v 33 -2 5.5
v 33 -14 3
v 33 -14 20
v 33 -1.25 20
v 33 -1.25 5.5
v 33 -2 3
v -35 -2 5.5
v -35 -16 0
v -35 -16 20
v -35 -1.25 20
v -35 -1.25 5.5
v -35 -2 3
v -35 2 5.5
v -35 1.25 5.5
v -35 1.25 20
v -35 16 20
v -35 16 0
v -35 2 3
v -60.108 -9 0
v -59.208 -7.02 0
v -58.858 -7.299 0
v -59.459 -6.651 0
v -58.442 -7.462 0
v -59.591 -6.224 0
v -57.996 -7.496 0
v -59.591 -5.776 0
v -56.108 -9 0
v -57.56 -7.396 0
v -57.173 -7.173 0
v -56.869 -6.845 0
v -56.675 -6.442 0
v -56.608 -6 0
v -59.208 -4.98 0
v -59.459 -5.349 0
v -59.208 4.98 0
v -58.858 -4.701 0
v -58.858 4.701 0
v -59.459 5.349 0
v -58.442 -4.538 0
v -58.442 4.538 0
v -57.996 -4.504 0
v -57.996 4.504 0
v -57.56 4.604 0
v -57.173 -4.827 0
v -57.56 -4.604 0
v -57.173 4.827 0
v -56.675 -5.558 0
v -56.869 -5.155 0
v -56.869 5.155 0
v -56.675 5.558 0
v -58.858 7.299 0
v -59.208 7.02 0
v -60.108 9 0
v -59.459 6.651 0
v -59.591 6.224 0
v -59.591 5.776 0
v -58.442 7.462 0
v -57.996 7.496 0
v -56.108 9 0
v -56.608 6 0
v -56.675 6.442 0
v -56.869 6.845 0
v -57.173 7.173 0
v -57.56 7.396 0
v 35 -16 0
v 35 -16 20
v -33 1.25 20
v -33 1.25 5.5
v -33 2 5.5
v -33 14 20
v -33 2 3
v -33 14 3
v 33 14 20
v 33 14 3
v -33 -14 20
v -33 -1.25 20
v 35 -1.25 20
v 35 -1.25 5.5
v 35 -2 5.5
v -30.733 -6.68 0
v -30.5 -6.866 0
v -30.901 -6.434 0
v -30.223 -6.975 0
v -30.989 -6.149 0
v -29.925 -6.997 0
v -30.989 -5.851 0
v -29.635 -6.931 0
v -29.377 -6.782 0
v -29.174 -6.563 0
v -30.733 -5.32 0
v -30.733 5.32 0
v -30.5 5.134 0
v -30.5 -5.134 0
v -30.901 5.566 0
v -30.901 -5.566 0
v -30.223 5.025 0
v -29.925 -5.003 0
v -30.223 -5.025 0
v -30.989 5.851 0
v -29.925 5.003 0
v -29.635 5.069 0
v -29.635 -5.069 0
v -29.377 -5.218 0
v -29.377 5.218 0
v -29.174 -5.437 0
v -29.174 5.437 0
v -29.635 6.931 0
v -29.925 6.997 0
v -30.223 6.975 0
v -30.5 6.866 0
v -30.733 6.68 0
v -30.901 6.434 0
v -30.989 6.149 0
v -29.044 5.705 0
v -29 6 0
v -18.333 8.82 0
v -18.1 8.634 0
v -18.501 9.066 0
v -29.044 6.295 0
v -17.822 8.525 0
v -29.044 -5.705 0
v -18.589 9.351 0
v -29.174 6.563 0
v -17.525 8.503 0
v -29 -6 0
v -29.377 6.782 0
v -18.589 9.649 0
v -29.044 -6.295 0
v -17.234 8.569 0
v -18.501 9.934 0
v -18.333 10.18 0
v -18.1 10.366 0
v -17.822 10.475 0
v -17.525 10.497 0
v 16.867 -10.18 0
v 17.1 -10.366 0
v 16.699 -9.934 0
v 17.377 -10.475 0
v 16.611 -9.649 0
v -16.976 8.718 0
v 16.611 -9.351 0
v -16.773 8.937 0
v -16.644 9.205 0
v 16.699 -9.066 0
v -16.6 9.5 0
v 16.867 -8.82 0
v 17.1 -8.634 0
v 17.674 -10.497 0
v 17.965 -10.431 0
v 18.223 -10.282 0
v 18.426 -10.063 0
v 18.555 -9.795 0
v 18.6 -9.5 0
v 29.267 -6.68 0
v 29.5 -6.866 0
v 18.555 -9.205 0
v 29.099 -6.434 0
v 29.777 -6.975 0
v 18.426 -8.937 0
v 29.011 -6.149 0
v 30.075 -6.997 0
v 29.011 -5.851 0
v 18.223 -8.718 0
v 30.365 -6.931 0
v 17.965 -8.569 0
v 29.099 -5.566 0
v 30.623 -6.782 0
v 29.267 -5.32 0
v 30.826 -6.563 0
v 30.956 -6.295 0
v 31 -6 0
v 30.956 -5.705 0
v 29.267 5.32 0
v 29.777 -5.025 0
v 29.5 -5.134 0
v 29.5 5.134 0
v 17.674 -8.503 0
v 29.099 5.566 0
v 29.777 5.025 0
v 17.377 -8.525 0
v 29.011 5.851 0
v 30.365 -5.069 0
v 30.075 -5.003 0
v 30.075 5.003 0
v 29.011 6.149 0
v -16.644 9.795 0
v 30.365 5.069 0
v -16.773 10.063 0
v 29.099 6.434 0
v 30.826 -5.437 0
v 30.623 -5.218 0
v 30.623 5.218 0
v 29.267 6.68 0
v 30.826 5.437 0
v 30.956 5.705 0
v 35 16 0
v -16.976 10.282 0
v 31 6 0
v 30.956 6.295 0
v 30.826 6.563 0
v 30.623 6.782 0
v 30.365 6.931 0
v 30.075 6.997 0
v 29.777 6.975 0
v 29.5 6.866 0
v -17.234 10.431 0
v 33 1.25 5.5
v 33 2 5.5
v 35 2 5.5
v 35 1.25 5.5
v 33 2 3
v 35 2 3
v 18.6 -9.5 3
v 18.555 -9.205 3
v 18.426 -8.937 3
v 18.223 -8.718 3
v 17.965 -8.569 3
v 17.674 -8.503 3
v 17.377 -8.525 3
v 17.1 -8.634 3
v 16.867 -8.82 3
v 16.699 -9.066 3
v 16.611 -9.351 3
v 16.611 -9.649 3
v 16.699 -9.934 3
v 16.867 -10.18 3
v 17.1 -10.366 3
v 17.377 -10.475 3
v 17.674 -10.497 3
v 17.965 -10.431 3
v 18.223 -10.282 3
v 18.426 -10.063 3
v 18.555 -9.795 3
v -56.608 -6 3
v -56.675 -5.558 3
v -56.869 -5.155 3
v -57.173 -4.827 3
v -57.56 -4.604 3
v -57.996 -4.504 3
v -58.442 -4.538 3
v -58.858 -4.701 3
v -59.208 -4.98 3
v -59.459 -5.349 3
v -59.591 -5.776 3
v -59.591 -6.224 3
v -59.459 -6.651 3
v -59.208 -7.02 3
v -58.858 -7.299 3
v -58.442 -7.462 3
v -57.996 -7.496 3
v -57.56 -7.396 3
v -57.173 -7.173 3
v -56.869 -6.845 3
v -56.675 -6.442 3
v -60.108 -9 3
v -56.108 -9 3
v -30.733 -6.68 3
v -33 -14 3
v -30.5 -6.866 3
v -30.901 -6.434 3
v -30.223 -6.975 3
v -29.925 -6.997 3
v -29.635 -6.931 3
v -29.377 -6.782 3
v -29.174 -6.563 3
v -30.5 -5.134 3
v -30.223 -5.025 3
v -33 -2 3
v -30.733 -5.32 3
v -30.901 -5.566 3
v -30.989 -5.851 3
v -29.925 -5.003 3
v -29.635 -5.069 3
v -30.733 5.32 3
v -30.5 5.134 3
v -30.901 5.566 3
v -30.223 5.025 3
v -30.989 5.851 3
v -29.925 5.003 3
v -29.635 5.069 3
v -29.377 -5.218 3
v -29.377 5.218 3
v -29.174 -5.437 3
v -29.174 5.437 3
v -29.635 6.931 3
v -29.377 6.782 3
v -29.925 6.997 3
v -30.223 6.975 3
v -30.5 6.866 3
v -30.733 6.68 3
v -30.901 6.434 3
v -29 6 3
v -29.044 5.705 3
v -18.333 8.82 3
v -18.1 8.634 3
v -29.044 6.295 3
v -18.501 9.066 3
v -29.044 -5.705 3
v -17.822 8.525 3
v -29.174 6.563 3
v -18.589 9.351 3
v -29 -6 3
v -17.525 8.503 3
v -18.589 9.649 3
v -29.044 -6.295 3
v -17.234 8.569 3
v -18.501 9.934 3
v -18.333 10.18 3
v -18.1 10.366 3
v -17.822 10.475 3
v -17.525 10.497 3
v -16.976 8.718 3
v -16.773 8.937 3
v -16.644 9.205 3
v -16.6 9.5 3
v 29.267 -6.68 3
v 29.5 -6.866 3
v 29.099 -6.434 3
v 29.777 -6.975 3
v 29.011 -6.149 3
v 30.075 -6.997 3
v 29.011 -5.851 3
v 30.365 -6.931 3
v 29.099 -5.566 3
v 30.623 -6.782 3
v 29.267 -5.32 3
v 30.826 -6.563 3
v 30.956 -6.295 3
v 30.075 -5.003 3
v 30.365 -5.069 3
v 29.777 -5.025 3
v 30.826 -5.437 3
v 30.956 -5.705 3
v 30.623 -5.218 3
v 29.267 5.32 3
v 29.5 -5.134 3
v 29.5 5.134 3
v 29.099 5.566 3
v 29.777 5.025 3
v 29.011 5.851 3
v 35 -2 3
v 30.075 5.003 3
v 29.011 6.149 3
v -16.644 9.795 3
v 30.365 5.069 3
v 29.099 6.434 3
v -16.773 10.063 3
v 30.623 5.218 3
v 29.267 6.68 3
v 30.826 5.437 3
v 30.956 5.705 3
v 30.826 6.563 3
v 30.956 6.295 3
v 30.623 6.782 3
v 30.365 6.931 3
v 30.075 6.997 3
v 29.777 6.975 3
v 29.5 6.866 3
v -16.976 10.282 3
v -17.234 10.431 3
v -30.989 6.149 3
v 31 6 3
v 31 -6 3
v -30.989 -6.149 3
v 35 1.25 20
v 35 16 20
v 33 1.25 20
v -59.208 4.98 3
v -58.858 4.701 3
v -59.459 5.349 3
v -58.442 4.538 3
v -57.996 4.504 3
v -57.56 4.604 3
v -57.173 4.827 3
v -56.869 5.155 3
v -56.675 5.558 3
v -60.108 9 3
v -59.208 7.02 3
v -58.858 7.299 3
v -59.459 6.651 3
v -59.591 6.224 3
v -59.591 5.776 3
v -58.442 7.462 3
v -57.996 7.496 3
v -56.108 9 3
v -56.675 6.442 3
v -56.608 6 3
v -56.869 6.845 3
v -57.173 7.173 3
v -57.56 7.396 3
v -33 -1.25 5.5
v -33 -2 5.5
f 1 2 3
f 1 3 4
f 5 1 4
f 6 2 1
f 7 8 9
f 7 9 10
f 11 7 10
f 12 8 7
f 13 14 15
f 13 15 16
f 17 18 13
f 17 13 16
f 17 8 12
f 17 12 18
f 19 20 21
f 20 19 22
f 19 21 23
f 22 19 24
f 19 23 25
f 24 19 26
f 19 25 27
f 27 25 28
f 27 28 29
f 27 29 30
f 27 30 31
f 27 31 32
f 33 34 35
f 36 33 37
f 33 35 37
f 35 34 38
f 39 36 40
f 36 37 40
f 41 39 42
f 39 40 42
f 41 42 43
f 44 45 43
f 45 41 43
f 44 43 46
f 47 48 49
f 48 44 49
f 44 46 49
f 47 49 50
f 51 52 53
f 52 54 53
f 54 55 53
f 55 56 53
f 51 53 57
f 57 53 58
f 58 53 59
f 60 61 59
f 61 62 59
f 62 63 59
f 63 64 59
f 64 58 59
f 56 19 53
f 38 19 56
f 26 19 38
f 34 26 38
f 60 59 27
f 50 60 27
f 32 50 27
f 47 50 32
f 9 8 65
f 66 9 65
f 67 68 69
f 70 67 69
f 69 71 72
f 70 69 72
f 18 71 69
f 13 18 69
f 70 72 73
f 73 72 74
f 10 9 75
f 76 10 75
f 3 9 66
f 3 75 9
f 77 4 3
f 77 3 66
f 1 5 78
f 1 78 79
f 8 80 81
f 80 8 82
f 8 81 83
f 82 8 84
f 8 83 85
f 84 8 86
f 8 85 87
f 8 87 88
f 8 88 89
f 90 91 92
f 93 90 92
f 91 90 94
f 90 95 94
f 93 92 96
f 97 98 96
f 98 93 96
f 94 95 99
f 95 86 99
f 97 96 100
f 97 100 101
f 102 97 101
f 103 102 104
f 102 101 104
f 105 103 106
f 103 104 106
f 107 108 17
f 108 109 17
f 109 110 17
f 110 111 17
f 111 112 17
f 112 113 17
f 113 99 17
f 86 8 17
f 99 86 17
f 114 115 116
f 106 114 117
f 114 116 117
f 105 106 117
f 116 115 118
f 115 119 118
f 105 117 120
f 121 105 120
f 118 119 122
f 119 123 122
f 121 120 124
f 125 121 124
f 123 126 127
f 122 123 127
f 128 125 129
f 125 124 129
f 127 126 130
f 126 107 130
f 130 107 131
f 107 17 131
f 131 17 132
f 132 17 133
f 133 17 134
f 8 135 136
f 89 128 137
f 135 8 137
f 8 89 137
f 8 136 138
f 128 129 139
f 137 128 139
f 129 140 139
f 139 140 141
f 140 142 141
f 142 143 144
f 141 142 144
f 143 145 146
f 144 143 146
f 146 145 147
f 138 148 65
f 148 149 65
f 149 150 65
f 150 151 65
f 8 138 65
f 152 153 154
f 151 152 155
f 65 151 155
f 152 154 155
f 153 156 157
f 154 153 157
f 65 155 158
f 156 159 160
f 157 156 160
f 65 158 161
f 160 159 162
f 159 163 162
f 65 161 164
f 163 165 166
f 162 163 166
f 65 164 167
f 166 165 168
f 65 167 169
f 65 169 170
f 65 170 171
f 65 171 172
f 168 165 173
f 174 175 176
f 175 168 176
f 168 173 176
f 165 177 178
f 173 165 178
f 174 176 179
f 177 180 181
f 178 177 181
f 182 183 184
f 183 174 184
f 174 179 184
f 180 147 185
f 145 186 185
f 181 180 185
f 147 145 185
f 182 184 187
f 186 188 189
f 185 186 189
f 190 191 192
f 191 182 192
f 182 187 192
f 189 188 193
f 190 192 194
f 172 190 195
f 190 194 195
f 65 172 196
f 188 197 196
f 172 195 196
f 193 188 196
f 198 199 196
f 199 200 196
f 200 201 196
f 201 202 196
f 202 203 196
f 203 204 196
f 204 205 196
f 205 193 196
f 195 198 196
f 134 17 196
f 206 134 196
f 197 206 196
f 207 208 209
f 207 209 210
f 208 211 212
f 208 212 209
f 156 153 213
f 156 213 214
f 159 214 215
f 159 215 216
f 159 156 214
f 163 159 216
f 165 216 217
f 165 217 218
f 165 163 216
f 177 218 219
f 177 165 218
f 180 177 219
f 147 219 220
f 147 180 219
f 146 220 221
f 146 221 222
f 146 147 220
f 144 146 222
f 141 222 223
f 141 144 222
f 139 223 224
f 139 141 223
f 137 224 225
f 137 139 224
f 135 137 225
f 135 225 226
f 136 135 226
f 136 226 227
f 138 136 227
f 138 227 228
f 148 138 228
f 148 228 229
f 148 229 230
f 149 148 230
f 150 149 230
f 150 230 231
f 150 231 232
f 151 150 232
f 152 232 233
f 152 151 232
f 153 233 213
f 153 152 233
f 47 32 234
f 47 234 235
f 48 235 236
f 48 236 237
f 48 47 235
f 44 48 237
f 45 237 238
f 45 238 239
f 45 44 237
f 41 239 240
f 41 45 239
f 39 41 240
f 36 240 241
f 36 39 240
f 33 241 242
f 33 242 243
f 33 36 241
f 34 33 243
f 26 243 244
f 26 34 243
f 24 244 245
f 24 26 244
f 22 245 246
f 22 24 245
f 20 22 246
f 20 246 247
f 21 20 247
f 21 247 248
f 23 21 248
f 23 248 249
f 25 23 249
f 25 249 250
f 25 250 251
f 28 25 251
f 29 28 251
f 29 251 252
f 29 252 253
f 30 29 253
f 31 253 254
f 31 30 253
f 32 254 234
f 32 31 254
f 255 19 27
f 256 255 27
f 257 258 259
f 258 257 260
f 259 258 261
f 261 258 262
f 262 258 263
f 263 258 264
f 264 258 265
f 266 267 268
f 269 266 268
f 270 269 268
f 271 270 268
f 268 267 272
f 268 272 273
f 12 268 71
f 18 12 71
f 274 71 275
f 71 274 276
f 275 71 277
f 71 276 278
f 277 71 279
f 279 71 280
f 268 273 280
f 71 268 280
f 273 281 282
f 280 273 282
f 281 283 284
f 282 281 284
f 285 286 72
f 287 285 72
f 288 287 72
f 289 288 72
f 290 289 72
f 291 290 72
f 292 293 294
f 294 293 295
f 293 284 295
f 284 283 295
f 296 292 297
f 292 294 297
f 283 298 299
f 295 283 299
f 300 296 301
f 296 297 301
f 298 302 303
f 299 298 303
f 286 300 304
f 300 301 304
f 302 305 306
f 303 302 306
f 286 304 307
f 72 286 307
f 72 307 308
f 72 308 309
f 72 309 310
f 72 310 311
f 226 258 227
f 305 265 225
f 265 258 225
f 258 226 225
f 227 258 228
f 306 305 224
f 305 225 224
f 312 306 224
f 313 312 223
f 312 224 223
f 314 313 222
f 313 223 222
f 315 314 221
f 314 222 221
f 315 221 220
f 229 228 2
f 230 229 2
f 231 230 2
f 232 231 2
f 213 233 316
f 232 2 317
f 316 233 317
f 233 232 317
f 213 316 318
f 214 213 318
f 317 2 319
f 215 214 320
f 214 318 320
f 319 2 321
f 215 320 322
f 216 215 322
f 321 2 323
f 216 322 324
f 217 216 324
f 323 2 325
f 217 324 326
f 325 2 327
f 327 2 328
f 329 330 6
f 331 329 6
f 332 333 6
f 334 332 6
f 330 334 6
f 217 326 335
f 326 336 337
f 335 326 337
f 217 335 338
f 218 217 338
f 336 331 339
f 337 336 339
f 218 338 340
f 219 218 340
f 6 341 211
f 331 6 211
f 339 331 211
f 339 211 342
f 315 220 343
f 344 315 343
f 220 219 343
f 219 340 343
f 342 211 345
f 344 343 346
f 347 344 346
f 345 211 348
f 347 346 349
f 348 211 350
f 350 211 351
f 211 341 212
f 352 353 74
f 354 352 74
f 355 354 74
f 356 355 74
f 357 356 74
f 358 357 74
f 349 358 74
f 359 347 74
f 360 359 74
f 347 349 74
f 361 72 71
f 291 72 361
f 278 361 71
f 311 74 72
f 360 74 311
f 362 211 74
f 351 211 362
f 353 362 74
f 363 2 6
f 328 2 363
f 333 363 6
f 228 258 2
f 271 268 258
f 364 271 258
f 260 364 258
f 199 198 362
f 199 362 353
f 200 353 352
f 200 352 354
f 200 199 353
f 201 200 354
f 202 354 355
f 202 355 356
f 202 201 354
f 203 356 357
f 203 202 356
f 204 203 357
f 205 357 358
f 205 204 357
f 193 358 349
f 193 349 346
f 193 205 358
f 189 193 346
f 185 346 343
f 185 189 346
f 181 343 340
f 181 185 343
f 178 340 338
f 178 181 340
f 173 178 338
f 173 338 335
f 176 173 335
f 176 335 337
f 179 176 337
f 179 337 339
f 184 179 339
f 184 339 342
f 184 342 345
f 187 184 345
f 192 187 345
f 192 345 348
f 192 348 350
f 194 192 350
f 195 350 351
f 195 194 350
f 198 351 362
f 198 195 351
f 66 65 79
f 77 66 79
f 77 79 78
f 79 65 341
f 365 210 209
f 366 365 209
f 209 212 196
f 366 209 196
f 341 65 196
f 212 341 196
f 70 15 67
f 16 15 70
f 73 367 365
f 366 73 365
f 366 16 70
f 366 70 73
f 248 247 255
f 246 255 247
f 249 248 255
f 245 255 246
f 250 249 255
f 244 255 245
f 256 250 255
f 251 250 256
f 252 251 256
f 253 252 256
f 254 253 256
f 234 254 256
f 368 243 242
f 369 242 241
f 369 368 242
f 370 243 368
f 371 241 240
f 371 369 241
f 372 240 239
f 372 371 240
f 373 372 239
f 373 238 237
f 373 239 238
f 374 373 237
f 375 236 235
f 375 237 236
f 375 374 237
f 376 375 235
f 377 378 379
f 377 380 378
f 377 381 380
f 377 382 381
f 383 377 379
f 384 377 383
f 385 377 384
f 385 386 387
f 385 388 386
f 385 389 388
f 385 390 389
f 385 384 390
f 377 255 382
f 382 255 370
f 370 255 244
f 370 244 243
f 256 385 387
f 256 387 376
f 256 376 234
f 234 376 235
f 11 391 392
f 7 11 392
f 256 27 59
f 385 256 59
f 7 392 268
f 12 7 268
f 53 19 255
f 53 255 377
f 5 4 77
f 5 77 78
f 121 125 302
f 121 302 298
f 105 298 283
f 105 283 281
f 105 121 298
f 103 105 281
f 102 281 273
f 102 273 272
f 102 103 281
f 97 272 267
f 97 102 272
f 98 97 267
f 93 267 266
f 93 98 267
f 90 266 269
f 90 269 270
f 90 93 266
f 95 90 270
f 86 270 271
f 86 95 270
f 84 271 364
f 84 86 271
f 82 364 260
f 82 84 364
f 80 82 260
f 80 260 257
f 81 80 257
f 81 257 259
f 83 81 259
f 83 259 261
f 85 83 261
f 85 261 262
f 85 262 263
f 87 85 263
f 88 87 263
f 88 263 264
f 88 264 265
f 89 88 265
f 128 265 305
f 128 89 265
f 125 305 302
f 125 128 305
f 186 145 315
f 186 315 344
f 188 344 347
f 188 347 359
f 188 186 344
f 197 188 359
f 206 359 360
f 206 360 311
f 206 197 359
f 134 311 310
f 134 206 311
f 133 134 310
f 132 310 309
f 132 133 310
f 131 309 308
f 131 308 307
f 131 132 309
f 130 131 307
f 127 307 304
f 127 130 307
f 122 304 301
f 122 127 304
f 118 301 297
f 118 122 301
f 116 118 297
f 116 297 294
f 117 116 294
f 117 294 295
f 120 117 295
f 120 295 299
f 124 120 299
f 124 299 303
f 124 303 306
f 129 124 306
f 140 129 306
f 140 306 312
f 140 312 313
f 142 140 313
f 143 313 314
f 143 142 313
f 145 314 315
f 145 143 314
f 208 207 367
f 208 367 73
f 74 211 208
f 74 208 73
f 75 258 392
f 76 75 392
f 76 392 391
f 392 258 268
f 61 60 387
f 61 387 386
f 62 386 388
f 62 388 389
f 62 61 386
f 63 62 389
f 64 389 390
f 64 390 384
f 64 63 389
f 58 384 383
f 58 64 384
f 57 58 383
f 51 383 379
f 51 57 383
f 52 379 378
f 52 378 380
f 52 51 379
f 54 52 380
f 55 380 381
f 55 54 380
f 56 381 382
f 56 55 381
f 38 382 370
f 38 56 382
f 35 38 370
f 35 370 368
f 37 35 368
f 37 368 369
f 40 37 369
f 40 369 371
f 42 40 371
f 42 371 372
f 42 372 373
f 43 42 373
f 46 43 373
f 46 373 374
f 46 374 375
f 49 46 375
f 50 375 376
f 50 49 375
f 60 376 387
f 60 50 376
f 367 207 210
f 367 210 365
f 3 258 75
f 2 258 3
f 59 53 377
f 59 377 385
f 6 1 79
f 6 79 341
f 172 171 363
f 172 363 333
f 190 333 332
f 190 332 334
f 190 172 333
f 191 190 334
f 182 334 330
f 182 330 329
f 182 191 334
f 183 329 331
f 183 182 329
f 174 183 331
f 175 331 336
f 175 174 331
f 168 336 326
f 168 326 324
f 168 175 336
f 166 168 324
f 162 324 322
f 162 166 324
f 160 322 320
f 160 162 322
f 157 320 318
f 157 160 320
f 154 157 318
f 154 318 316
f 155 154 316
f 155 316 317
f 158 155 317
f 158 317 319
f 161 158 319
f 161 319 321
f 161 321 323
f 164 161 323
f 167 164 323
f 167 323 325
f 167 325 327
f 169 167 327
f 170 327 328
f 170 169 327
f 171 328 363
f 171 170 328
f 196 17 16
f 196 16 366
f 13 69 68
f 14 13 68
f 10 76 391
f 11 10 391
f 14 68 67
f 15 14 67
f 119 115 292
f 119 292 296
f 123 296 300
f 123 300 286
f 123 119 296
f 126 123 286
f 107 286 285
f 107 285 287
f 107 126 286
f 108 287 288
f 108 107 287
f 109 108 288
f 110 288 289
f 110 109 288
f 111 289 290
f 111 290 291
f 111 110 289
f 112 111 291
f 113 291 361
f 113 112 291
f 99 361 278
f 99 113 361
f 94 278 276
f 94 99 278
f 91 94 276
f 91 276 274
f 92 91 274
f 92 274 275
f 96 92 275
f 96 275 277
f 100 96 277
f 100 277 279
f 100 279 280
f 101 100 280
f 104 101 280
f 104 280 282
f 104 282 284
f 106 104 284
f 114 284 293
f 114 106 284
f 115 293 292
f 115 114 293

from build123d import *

# Parameters (mm, degrees)
SKETCH_W          = 70
SKETCH_H          = 32
SKETCH_R          = 1
PAD_DEPTH         = 3
SKETCH001_W       = 70
SKETCH001_H       = 32
SKETCH001_W_2     = 66
SKETCH001_H_2     = 28
PAD001_DEPTH      = 20
POCKET_DEPTH      = 35.001
POCKET_DEPTH_BACK = -35.001
SKETCH003_W       = 4
SKETCH003_H       = 18
SKETCH003_R       = 1.5
PAD002_DEPTH      = 3


with BuildPart() as body:
    # Sketch → Pad (new body)
    with BuildSketch(Plane.XY):
        Rectangle(SKETCH_W, SKETCH_H)
        with Locations((-17.599716, 9.5)):
            Circle(SKETCH_R, mode=Mode.SUBTRACT)
        with Locations((17.599716, -9.5)):
            Circle(SKETCH_R, mode=Mode.SUBTRACT)
        with Locations((-30, 6)):
            Circle(SKETCH_R, mode=Mode.SUBTRACT)
        with Locations((-30, -6)):
            Circle(SKETCH_R, mode=Mode.SUBTRACT)
        with Locations((30, 6)):
            Circle(SKETCH_R, mode=Mode.SUBTRACT)
        with Locations((30, -6)):
            Circle(SKETCH_R, mode=Mode.SUBTRACT)
    extrude(amount=PAD_DEPTH)

    # Sketch001 → Pad001 (join)
    with BuildSketch(Plane.XY):
        Rectangle(SKETCH001_W, SKETCH001_H)
        Rectangle(SKETCH001_W_2, SKETCH001_H_2, mode=Mode.SUBTRACT)
    extrude(amount=PAD001_DEPTH)

    # Sketch002 → Pocket (cut, two sides)
    with BuildSketch(Plane.YZ) as pocket_sk:
        Polygon((-2, 5.5), (-2, 3), (2, 3), (2, 5.5), (1.25, 5.5), (1.25, 20), (-1.25, 20), (-1.25, 5.5), align=None)
    extrude(amount=-POCKET_DEPTH, mode=Mode.SUBTRACT)
    extrude(pocket_sk.sketch, amount=-POCKET_DEPTH_BACK, mode=Mode.SUBTRACT)


with BuildPart() as body001:
    # Sketch003 → Pad002 (new body)
    with BuildSketch(Plane.XY):
        with Locations((-58.107944, 0)):
            Rectangle(SKETCH003_W, SKETCH003_H)
        with Locations((-58.107944, 6)):
            Circle(SKETCH003_R, mode=Mode.SUBTRACT)
        with Locations((-58.107944, -6)):
            Circle(SKETCH003_R, mode=Mode.SUBTRACT)
    extrude(amount=PAD002_DEPTH)


solid = Compound([body.part, body001.part])
